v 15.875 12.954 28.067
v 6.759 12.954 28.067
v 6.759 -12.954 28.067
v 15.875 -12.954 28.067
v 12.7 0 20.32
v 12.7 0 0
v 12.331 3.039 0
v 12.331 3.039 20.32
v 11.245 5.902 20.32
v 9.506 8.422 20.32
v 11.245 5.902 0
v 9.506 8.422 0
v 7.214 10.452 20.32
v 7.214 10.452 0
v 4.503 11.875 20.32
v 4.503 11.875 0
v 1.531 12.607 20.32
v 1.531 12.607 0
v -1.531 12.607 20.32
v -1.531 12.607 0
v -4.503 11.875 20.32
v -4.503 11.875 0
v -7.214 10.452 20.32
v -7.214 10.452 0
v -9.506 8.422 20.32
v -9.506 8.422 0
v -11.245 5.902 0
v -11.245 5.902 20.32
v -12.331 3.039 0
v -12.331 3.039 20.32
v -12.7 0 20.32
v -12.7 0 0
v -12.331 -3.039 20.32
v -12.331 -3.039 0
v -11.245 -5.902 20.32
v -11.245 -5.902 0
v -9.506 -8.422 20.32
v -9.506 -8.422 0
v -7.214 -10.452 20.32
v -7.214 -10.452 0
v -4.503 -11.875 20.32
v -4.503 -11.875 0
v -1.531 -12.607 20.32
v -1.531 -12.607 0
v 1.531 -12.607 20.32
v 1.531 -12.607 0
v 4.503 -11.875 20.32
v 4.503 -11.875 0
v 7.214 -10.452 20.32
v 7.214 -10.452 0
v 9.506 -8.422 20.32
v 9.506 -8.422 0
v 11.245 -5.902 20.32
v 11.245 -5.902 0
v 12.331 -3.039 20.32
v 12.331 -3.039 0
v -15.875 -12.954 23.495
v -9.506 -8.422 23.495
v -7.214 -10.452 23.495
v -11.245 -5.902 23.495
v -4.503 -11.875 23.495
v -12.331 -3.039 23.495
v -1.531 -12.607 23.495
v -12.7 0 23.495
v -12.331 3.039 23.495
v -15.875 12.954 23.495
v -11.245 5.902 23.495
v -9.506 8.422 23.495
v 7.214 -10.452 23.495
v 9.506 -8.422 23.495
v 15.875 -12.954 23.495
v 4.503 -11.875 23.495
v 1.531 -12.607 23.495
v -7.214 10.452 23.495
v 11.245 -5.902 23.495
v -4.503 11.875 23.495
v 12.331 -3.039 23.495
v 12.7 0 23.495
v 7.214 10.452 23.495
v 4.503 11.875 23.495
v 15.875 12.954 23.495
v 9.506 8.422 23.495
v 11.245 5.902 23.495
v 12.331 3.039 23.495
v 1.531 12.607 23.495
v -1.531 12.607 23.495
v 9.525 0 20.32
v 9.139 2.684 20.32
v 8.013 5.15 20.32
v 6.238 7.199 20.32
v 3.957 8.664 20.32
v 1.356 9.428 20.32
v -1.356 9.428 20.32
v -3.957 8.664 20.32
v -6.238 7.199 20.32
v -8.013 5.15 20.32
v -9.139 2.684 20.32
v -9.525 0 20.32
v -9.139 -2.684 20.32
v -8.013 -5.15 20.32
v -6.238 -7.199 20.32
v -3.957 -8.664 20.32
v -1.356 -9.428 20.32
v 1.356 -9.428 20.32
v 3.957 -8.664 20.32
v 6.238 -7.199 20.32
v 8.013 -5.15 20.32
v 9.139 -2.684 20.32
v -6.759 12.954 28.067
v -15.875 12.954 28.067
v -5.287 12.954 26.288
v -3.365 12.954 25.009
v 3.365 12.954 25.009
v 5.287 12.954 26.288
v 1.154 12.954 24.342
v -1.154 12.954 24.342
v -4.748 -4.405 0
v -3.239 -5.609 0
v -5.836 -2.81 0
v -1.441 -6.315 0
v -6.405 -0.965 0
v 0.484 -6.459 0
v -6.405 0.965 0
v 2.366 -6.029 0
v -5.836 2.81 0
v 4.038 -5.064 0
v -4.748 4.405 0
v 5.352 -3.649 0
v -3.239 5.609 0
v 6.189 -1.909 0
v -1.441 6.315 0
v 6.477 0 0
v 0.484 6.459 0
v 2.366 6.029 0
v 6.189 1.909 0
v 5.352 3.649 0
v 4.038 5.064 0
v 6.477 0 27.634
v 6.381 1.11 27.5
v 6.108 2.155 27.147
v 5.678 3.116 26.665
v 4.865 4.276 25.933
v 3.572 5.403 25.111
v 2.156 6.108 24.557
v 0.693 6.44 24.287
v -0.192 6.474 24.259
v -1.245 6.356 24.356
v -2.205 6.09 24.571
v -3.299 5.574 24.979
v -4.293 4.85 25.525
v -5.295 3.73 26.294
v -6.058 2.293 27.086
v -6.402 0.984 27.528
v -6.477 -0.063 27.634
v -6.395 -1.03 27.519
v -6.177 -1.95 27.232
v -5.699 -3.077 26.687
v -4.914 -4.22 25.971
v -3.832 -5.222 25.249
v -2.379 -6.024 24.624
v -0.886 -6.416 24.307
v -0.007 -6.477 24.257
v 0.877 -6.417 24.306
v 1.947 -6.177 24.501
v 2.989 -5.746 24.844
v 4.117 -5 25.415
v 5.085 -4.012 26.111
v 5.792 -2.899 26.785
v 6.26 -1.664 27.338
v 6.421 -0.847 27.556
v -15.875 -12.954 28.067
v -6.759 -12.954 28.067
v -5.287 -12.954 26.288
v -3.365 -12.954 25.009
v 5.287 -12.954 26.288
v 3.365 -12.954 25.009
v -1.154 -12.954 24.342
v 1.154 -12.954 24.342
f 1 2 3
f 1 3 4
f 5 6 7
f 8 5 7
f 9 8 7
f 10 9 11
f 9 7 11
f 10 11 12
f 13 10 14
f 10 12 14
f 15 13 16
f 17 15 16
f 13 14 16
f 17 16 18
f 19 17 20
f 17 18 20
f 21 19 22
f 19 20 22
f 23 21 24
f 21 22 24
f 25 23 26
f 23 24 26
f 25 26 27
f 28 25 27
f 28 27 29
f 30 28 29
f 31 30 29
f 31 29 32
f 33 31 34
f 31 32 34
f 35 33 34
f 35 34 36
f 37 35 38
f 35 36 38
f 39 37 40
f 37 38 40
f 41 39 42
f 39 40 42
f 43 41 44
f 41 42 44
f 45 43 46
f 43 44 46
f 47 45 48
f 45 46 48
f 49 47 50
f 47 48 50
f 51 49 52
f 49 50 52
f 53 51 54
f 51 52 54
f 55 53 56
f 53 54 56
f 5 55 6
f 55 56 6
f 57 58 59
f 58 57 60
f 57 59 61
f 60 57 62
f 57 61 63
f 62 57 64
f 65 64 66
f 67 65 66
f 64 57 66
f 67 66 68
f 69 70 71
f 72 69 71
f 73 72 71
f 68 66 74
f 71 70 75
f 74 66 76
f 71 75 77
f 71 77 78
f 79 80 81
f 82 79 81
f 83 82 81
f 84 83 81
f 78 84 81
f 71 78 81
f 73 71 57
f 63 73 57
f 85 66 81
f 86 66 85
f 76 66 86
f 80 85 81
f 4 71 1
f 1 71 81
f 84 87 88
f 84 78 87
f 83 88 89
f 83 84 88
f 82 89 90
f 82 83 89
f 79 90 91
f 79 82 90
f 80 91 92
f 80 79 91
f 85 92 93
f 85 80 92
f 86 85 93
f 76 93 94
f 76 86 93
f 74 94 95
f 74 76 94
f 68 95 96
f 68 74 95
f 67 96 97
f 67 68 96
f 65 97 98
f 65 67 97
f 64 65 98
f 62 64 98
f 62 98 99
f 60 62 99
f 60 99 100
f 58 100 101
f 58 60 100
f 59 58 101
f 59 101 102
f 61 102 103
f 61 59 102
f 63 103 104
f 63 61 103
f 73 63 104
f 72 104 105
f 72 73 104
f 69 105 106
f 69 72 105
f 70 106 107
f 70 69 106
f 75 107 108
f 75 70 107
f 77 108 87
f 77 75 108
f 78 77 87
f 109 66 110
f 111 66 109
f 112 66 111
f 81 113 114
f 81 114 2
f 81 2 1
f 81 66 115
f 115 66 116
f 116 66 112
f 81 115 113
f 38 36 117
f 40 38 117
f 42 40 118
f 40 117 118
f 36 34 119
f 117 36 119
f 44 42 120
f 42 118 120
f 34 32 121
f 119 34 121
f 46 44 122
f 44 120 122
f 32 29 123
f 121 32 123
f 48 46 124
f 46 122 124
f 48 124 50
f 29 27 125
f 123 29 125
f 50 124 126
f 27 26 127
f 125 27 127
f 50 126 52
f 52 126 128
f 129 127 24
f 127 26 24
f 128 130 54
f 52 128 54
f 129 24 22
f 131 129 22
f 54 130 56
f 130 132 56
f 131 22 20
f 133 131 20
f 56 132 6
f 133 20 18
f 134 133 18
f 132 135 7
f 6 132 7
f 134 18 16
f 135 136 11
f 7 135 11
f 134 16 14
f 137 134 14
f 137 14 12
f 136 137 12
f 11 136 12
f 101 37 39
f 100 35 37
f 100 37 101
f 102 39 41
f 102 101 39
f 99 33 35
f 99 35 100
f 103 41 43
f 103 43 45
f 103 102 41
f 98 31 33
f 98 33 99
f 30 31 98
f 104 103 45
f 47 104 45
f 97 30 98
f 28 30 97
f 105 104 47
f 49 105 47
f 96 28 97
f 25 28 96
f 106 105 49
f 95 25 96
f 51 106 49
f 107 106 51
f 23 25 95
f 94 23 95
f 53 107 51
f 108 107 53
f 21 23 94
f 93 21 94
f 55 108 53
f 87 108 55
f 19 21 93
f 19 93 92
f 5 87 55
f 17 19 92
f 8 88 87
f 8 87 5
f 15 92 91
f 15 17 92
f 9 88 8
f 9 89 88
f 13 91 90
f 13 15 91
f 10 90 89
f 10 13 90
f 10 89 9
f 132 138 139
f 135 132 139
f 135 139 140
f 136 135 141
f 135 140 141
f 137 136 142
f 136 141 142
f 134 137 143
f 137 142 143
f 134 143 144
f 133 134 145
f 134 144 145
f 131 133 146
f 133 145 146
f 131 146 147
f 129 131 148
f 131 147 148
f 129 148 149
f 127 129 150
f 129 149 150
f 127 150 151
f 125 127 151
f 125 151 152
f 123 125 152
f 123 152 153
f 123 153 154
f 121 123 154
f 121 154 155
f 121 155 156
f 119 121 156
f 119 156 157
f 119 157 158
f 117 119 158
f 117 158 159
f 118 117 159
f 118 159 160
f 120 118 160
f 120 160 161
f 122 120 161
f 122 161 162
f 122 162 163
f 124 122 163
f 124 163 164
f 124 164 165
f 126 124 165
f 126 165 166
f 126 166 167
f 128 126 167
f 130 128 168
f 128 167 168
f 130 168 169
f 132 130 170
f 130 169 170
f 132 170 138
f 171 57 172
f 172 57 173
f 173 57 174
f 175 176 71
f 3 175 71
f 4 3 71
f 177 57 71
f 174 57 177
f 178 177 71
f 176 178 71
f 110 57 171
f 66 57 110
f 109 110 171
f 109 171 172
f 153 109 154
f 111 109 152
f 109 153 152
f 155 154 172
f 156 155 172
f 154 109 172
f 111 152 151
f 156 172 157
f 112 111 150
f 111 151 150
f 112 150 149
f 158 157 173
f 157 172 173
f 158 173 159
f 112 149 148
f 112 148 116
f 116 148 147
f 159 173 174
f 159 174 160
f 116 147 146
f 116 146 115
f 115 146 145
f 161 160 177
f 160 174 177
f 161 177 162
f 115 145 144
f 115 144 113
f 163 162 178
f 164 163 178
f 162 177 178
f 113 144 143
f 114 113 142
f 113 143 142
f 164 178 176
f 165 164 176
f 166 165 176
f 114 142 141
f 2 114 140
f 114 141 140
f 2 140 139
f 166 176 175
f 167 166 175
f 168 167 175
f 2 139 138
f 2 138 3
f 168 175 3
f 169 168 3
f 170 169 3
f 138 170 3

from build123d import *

# Parameters (mm, degrees)
F0_R      = 12.7
F1_DEPTH  = 20.32
F3_R      = 9.525
F4_DEPTH  = 3.175
F4_TAPER  = -45
F6_R      = 6.477
F7_DEPTH  = 23.496
F8_W      = 31.75
F8_H      = 25.908
F9_DEPTH  = 4.572
F11_R     = 6.477
F12_DEPTH = 28.068
F14_R     = 7.8994
F15_DEPTH = 25.909


with BuildPart() as f1:
    # F0 (on Top) → F1 (new body)
    with BuildSketch(Plane.XY):
        Circle(F0_R)
    extrude(amount=F1_DEPTH)

    # F3 (on offset) → F4 (join)
    with BuildSketch(Plane.XY.offset(20.32)):
        Circle(F3_R)
    extrude(amount=F4_DEPTH, taper=F4_TAPER)

    # F6 (on offset) → F7 (cut, through all)
    with BuildSketch(Plane.XY.offset(23.495)):
        Circle(F6_R)
    extrude(amount=-F7_DEPTH, mode=Mode.SUBTRACT)

    # F8 (on offset) → F9 (join)
    with BuildSketch(Plane.XY.offset(23.495)):
        Rectangle(F8_W, F8_H)
    extrude(amount=F9_DEPTH)

    # F11 (on offset) → F12 (cut, through all)
    with BuildSketch(Plane.XY.offset(28.067)):
        Circle(F11_R)
    extrude(amount=-F12_DEPTH, mode=Mode.SUBTRACT)

    # F14 (on offset) → F15 (cut, through all)
    with BuildSketch(Plane.XZ.offset(12.954)):
        with Locations((0, 32.1564)):
            Circle(F14_R)
    extrude(amount=-F15_DEPTH, mode=Mode.SUBTRACT)


solid = f1.part
